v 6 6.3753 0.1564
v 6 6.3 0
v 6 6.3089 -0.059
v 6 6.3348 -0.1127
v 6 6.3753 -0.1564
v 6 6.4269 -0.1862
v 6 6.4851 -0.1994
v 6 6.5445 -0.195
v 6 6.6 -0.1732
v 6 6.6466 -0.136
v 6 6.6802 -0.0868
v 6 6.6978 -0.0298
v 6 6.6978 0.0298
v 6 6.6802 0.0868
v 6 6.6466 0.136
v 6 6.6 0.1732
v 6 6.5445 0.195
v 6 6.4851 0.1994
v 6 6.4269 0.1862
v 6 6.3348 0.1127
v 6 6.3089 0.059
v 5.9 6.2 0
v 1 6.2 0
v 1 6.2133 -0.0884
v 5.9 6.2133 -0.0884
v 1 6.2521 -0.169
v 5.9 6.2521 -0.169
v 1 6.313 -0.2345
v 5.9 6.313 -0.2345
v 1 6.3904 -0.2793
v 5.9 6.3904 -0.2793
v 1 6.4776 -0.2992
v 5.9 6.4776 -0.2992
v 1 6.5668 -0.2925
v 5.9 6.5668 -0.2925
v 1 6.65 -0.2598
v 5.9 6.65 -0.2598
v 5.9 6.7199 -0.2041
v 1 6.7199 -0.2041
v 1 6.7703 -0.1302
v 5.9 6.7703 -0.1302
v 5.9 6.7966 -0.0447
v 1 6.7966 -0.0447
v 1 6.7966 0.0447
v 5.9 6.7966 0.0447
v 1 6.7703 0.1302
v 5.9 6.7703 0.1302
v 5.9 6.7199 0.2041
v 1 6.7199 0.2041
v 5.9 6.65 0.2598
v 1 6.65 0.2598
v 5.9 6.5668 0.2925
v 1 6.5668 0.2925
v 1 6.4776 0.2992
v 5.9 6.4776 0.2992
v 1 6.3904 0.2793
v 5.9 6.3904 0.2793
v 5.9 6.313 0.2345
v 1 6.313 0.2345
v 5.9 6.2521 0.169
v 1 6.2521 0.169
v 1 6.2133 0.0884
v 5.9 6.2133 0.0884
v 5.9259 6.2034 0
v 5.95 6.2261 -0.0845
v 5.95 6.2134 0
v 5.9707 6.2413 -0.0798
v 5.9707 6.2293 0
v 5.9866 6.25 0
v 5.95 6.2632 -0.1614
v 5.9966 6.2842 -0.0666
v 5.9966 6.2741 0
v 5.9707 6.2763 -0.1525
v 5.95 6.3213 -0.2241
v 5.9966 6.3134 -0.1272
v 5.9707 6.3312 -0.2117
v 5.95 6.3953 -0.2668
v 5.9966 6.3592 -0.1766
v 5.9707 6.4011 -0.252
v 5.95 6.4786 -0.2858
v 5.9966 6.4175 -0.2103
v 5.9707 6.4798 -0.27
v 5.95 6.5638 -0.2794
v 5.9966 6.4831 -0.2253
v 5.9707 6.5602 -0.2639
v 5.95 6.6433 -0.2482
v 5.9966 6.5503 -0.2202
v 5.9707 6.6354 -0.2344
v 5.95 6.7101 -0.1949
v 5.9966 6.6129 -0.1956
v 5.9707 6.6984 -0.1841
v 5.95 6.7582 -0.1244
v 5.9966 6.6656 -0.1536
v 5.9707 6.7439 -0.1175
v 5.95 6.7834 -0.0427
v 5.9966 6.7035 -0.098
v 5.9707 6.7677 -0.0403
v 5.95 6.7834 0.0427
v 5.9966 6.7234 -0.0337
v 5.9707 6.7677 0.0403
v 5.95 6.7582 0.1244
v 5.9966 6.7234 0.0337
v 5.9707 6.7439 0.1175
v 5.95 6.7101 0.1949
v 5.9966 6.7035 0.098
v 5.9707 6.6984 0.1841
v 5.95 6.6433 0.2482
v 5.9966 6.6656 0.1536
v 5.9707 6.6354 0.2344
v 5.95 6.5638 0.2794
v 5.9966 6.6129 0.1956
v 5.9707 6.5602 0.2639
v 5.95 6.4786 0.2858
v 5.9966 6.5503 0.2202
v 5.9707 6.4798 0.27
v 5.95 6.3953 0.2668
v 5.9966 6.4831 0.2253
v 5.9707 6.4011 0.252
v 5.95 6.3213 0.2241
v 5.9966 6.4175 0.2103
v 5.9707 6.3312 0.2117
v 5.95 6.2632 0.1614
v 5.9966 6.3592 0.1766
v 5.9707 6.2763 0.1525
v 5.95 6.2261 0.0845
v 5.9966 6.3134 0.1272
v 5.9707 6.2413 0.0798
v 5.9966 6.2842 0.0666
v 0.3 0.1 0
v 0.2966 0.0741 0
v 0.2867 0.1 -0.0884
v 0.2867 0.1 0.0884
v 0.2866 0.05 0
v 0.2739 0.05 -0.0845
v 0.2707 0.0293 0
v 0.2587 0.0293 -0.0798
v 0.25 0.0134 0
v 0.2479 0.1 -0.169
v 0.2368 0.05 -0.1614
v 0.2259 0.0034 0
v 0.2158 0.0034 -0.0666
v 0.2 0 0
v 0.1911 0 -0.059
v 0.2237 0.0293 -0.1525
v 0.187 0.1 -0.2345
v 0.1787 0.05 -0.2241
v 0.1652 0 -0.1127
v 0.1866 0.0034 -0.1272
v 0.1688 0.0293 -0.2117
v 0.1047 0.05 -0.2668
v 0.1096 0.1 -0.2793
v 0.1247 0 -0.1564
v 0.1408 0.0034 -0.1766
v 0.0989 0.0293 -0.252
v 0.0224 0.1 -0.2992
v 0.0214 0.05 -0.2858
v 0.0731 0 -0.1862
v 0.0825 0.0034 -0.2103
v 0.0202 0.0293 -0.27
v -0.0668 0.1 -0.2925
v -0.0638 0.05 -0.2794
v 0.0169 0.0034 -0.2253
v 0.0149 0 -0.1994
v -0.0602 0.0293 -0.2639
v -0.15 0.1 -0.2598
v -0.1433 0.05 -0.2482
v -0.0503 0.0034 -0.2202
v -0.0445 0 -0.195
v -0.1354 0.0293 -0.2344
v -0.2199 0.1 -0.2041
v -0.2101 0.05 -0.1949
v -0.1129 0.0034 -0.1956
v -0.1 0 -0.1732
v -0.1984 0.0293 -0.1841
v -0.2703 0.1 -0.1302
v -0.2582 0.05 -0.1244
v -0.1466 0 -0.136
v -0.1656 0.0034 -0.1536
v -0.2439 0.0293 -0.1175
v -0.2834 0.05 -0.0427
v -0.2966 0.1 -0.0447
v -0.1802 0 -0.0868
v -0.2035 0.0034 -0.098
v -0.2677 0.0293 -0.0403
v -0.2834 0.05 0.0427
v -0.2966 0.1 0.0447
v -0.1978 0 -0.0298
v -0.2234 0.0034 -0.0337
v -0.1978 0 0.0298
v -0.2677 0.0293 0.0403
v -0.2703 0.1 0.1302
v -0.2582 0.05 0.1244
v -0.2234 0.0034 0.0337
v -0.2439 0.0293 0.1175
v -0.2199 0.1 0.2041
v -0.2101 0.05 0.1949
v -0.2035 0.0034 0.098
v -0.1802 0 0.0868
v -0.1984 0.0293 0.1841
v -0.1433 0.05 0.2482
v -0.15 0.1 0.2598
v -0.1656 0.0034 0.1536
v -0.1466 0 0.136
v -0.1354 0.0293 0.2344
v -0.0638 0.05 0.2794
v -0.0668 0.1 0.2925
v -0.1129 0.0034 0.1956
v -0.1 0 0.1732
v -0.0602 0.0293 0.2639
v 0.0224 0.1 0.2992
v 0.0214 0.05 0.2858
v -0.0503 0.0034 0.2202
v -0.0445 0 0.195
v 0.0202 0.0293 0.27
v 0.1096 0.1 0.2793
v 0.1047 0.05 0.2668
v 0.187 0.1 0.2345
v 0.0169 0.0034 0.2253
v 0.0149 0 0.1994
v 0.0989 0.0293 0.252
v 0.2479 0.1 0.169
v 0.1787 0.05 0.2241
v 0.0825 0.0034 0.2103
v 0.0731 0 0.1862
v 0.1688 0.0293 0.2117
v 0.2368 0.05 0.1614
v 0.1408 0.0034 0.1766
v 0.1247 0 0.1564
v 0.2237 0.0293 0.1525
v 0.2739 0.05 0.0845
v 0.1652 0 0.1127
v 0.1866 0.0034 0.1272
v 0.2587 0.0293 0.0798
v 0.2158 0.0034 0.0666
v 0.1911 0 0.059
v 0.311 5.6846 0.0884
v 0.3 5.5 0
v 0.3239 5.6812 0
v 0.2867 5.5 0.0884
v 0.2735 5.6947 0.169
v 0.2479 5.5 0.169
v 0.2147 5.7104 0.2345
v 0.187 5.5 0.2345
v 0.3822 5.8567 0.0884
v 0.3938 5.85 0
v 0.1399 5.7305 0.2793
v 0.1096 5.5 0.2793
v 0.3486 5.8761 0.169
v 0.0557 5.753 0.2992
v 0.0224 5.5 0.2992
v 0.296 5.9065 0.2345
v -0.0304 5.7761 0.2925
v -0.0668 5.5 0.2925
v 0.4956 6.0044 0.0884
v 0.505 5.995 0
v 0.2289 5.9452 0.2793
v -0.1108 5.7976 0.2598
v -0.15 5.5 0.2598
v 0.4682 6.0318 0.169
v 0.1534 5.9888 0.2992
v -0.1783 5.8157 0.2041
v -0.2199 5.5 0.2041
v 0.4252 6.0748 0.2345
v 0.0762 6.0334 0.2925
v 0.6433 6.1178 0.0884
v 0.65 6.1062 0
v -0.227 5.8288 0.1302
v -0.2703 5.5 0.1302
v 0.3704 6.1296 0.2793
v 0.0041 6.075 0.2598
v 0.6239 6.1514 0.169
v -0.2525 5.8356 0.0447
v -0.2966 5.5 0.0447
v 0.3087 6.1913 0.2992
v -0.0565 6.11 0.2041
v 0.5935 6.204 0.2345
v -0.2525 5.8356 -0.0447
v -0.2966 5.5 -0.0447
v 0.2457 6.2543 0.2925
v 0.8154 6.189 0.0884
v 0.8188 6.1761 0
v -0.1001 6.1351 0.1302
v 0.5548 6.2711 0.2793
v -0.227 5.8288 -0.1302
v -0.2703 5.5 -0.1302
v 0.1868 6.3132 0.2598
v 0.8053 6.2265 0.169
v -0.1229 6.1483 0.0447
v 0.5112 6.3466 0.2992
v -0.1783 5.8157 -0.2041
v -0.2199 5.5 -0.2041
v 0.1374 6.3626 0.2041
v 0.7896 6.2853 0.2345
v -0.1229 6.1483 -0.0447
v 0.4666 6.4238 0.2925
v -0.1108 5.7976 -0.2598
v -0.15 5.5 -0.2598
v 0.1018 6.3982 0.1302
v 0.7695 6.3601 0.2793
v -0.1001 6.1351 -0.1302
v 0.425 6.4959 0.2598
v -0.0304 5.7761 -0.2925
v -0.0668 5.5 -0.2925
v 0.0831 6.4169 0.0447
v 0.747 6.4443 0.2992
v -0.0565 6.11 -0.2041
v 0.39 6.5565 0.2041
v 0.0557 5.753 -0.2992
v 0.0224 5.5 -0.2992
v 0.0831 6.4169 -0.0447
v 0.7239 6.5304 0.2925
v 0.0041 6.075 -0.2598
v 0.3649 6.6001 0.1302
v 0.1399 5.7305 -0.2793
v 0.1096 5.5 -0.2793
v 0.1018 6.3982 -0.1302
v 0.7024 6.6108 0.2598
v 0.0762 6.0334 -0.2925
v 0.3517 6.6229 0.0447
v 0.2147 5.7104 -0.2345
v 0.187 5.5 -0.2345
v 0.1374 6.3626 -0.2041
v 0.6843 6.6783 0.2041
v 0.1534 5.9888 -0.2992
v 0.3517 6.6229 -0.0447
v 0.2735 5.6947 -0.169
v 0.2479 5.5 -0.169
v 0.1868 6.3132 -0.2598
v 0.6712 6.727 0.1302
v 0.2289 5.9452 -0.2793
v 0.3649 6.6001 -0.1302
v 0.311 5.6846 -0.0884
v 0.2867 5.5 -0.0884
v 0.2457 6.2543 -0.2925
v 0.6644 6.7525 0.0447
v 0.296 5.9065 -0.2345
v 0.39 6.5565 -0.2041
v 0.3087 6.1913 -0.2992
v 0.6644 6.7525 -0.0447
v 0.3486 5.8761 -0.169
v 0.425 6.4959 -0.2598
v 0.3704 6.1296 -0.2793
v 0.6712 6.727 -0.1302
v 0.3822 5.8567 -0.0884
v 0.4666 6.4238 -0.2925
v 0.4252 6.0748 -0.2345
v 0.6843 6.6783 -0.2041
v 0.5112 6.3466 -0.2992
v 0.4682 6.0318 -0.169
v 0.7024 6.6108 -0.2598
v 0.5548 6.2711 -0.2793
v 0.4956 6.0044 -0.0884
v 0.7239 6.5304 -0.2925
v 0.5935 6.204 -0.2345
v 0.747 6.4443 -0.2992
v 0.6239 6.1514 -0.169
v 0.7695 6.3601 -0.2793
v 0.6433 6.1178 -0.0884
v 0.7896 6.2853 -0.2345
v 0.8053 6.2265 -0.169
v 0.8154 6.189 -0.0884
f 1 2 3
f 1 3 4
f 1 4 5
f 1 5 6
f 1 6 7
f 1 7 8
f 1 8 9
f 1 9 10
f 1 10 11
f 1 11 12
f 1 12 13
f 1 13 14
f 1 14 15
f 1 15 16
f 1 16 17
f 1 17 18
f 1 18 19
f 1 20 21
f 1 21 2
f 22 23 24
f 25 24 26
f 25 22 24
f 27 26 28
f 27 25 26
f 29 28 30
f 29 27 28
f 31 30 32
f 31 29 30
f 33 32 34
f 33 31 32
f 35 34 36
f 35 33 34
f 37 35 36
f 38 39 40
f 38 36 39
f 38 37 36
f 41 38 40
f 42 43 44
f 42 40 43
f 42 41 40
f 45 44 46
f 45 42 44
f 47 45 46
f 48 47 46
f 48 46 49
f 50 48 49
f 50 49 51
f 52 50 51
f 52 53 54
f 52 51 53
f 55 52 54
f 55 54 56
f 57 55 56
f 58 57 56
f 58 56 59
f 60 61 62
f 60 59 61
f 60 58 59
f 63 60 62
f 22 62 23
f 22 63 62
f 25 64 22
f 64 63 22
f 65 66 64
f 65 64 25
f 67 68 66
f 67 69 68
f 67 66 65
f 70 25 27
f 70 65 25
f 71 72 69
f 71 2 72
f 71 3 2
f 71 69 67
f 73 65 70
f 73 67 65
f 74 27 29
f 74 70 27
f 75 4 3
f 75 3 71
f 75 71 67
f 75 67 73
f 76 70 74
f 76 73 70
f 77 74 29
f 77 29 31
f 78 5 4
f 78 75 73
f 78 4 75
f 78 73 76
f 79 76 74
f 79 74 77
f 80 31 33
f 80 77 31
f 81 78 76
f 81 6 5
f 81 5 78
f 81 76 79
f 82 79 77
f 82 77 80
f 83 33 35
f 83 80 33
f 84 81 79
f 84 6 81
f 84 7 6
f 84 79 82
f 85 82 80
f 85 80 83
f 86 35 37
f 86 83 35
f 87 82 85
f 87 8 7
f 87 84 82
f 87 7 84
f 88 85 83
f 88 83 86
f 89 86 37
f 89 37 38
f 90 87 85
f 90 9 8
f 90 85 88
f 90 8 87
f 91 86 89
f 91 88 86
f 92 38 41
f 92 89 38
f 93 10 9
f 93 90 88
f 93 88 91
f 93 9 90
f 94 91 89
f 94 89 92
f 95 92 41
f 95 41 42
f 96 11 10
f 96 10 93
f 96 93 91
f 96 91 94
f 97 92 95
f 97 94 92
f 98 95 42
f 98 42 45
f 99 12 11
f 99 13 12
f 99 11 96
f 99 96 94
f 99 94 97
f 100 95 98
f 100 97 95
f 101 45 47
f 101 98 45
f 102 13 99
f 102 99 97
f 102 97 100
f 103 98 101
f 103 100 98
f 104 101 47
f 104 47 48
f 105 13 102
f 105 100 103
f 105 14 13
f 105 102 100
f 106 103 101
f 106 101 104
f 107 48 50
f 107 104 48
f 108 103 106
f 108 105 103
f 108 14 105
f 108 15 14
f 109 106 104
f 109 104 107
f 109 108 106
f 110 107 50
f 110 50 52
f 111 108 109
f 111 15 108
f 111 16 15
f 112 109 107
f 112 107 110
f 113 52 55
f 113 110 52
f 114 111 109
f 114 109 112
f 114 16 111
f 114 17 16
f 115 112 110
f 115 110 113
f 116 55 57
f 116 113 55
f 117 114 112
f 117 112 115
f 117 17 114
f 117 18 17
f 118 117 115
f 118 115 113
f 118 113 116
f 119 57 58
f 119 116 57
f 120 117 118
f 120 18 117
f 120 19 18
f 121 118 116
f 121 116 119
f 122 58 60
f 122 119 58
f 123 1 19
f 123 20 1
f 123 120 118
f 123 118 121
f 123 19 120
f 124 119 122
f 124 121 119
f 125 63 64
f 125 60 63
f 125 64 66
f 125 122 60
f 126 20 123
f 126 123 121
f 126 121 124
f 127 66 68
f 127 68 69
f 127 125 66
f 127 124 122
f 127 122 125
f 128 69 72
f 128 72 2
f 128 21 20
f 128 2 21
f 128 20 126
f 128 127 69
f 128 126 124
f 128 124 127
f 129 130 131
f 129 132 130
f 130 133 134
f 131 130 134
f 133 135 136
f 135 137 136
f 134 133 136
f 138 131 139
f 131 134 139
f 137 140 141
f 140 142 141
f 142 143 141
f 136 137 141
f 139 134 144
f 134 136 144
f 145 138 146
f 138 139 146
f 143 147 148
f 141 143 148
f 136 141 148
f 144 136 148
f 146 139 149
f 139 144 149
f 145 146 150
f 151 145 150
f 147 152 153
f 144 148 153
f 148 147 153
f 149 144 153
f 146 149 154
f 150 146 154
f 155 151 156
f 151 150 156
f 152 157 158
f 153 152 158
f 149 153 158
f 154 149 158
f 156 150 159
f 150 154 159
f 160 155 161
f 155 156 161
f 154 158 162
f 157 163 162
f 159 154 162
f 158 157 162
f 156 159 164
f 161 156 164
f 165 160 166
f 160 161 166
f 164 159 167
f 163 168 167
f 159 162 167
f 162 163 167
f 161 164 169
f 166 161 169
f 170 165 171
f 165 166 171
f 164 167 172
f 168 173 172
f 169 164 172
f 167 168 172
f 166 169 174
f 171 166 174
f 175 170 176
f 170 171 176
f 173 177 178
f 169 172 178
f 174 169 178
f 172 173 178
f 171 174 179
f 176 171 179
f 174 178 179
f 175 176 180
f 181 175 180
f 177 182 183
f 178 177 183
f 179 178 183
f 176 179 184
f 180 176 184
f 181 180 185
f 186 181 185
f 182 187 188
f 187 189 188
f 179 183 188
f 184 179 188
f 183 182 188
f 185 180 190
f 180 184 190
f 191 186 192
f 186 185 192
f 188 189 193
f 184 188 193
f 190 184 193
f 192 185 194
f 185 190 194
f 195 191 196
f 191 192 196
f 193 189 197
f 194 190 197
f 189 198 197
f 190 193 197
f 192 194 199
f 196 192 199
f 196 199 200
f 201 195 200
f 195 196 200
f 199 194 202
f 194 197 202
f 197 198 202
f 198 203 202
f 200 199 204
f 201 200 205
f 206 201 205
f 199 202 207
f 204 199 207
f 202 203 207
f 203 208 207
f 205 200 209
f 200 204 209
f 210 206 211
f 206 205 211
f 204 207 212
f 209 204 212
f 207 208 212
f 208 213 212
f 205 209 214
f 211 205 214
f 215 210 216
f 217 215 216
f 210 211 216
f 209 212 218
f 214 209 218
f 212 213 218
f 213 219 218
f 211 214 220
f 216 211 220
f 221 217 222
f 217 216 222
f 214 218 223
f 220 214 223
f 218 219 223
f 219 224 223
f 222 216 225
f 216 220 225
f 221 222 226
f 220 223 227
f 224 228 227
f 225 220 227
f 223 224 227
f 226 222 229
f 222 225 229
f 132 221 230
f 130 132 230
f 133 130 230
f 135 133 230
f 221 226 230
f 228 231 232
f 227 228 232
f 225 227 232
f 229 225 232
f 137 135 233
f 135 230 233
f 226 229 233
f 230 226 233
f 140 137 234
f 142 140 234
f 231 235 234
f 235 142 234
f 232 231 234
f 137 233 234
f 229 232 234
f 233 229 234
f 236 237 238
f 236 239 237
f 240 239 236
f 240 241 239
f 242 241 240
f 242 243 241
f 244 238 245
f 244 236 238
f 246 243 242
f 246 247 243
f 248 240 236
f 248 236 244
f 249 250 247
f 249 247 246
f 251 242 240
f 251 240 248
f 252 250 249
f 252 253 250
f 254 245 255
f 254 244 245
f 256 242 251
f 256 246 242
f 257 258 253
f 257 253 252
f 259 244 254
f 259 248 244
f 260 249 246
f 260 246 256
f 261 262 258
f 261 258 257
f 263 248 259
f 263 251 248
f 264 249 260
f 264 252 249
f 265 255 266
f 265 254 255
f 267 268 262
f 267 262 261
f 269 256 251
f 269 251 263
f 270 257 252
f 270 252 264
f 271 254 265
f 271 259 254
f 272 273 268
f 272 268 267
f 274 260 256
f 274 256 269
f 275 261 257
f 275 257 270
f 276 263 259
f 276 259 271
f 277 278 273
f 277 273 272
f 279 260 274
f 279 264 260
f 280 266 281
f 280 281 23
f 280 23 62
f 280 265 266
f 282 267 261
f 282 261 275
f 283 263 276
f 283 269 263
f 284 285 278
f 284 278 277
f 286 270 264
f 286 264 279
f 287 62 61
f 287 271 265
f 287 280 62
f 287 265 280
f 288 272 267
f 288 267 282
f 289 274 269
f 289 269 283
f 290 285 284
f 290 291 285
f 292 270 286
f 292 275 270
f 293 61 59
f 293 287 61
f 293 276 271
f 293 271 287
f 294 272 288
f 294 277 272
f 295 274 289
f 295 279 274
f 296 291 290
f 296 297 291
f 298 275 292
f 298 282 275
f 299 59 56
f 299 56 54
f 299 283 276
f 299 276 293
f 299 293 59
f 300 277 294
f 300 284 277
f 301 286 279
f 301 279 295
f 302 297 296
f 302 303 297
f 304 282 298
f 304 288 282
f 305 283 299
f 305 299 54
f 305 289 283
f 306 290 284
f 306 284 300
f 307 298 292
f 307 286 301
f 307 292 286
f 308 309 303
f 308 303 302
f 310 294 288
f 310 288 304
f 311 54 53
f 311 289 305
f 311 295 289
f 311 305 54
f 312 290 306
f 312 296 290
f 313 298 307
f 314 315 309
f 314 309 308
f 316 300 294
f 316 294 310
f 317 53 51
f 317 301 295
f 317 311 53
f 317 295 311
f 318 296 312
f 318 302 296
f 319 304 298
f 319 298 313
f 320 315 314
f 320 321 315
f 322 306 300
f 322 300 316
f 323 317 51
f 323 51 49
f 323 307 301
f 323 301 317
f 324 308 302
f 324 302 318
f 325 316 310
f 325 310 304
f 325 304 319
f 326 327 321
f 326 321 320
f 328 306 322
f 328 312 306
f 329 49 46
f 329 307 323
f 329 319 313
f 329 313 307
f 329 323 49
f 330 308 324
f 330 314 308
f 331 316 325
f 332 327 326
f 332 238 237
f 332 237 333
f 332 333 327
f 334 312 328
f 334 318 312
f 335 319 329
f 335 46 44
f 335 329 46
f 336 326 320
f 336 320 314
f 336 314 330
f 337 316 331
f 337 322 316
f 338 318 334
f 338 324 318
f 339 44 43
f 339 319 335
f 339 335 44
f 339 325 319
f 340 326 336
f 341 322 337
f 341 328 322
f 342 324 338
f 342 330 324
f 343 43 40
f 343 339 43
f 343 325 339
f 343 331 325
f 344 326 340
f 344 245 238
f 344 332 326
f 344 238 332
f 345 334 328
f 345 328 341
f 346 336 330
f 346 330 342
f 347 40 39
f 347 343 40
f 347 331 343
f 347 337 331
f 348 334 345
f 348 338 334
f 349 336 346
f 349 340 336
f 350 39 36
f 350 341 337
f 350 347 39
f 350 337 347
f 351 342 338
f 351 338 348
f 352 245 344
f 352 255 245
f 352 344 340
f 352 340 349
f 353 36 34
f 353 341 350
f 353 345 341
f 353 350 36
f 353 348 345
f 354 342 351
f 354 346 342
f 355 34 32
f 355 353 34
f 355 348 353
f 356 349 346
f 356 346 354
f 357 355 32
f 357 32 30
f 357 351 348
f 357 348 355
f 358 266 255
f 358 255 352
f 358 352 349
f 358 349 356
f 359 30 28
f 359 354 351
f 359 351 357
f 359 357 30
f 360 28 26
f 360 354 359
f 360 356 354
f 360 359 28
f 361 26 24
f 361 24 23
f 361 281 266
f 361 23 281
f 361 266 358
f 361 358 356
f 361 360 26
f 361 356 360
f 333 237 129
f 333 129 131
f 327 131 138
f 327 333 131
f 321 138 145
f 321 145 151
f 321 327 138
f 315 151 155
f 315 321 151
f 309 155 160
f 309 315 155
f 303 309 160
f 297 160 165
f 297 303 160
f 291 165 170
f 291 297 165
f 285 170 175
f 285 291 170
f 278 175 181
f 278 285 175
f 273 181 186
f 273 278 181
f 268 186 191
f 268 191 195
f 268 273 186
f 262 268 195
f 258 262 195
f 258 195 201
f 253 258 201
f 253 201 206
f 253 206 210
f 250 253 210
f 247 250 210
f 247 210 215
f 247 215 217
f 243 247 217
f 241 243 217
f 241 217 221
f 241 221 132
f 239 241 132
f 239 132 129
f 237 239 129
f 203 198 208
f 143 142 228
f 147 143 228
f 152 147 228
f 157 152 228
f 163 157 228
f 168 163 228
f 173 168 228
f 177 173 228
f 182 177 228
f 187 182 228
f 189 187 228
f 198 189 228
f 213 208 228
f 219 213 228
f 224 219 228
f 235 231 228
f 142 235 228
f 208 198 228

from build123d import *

# Parameters (mm, degrees)
SKETCH4_R = 0.3
FILLET1_R = 0.1


with BuildPart() as part:
    # Sweep1: sweep along a path in Sketch3
    with BuildLine(Plane.XY) as sweep1_path:
        Line((0, 0), (0, 5.5))
        ThreePointArc((0, 5.5), (0.292893219, 6.207106781), (1, 6.5))
        Line((1, 6.5), (6, 6.5))
    # Sketch4 → Sweep1 (sweep)
    with BuildSketch(Plane(origin=(0, 0, 0), x_dir=(1, 0, 0), z_dir=(0, 1, 0))):
        Circle(SKETCH4_R)
    sweep(path=sweep1_path.line)

    # Fillet1
    fillet1_edges = [part.edges().sort_by_distance(p)[0] for p in [
        (-0.3, 0, 0),
        (6, 6.8, 0),
    ]]
    fillet(fillet1_edges, radius=FILLET1_R)


solid = part.part
